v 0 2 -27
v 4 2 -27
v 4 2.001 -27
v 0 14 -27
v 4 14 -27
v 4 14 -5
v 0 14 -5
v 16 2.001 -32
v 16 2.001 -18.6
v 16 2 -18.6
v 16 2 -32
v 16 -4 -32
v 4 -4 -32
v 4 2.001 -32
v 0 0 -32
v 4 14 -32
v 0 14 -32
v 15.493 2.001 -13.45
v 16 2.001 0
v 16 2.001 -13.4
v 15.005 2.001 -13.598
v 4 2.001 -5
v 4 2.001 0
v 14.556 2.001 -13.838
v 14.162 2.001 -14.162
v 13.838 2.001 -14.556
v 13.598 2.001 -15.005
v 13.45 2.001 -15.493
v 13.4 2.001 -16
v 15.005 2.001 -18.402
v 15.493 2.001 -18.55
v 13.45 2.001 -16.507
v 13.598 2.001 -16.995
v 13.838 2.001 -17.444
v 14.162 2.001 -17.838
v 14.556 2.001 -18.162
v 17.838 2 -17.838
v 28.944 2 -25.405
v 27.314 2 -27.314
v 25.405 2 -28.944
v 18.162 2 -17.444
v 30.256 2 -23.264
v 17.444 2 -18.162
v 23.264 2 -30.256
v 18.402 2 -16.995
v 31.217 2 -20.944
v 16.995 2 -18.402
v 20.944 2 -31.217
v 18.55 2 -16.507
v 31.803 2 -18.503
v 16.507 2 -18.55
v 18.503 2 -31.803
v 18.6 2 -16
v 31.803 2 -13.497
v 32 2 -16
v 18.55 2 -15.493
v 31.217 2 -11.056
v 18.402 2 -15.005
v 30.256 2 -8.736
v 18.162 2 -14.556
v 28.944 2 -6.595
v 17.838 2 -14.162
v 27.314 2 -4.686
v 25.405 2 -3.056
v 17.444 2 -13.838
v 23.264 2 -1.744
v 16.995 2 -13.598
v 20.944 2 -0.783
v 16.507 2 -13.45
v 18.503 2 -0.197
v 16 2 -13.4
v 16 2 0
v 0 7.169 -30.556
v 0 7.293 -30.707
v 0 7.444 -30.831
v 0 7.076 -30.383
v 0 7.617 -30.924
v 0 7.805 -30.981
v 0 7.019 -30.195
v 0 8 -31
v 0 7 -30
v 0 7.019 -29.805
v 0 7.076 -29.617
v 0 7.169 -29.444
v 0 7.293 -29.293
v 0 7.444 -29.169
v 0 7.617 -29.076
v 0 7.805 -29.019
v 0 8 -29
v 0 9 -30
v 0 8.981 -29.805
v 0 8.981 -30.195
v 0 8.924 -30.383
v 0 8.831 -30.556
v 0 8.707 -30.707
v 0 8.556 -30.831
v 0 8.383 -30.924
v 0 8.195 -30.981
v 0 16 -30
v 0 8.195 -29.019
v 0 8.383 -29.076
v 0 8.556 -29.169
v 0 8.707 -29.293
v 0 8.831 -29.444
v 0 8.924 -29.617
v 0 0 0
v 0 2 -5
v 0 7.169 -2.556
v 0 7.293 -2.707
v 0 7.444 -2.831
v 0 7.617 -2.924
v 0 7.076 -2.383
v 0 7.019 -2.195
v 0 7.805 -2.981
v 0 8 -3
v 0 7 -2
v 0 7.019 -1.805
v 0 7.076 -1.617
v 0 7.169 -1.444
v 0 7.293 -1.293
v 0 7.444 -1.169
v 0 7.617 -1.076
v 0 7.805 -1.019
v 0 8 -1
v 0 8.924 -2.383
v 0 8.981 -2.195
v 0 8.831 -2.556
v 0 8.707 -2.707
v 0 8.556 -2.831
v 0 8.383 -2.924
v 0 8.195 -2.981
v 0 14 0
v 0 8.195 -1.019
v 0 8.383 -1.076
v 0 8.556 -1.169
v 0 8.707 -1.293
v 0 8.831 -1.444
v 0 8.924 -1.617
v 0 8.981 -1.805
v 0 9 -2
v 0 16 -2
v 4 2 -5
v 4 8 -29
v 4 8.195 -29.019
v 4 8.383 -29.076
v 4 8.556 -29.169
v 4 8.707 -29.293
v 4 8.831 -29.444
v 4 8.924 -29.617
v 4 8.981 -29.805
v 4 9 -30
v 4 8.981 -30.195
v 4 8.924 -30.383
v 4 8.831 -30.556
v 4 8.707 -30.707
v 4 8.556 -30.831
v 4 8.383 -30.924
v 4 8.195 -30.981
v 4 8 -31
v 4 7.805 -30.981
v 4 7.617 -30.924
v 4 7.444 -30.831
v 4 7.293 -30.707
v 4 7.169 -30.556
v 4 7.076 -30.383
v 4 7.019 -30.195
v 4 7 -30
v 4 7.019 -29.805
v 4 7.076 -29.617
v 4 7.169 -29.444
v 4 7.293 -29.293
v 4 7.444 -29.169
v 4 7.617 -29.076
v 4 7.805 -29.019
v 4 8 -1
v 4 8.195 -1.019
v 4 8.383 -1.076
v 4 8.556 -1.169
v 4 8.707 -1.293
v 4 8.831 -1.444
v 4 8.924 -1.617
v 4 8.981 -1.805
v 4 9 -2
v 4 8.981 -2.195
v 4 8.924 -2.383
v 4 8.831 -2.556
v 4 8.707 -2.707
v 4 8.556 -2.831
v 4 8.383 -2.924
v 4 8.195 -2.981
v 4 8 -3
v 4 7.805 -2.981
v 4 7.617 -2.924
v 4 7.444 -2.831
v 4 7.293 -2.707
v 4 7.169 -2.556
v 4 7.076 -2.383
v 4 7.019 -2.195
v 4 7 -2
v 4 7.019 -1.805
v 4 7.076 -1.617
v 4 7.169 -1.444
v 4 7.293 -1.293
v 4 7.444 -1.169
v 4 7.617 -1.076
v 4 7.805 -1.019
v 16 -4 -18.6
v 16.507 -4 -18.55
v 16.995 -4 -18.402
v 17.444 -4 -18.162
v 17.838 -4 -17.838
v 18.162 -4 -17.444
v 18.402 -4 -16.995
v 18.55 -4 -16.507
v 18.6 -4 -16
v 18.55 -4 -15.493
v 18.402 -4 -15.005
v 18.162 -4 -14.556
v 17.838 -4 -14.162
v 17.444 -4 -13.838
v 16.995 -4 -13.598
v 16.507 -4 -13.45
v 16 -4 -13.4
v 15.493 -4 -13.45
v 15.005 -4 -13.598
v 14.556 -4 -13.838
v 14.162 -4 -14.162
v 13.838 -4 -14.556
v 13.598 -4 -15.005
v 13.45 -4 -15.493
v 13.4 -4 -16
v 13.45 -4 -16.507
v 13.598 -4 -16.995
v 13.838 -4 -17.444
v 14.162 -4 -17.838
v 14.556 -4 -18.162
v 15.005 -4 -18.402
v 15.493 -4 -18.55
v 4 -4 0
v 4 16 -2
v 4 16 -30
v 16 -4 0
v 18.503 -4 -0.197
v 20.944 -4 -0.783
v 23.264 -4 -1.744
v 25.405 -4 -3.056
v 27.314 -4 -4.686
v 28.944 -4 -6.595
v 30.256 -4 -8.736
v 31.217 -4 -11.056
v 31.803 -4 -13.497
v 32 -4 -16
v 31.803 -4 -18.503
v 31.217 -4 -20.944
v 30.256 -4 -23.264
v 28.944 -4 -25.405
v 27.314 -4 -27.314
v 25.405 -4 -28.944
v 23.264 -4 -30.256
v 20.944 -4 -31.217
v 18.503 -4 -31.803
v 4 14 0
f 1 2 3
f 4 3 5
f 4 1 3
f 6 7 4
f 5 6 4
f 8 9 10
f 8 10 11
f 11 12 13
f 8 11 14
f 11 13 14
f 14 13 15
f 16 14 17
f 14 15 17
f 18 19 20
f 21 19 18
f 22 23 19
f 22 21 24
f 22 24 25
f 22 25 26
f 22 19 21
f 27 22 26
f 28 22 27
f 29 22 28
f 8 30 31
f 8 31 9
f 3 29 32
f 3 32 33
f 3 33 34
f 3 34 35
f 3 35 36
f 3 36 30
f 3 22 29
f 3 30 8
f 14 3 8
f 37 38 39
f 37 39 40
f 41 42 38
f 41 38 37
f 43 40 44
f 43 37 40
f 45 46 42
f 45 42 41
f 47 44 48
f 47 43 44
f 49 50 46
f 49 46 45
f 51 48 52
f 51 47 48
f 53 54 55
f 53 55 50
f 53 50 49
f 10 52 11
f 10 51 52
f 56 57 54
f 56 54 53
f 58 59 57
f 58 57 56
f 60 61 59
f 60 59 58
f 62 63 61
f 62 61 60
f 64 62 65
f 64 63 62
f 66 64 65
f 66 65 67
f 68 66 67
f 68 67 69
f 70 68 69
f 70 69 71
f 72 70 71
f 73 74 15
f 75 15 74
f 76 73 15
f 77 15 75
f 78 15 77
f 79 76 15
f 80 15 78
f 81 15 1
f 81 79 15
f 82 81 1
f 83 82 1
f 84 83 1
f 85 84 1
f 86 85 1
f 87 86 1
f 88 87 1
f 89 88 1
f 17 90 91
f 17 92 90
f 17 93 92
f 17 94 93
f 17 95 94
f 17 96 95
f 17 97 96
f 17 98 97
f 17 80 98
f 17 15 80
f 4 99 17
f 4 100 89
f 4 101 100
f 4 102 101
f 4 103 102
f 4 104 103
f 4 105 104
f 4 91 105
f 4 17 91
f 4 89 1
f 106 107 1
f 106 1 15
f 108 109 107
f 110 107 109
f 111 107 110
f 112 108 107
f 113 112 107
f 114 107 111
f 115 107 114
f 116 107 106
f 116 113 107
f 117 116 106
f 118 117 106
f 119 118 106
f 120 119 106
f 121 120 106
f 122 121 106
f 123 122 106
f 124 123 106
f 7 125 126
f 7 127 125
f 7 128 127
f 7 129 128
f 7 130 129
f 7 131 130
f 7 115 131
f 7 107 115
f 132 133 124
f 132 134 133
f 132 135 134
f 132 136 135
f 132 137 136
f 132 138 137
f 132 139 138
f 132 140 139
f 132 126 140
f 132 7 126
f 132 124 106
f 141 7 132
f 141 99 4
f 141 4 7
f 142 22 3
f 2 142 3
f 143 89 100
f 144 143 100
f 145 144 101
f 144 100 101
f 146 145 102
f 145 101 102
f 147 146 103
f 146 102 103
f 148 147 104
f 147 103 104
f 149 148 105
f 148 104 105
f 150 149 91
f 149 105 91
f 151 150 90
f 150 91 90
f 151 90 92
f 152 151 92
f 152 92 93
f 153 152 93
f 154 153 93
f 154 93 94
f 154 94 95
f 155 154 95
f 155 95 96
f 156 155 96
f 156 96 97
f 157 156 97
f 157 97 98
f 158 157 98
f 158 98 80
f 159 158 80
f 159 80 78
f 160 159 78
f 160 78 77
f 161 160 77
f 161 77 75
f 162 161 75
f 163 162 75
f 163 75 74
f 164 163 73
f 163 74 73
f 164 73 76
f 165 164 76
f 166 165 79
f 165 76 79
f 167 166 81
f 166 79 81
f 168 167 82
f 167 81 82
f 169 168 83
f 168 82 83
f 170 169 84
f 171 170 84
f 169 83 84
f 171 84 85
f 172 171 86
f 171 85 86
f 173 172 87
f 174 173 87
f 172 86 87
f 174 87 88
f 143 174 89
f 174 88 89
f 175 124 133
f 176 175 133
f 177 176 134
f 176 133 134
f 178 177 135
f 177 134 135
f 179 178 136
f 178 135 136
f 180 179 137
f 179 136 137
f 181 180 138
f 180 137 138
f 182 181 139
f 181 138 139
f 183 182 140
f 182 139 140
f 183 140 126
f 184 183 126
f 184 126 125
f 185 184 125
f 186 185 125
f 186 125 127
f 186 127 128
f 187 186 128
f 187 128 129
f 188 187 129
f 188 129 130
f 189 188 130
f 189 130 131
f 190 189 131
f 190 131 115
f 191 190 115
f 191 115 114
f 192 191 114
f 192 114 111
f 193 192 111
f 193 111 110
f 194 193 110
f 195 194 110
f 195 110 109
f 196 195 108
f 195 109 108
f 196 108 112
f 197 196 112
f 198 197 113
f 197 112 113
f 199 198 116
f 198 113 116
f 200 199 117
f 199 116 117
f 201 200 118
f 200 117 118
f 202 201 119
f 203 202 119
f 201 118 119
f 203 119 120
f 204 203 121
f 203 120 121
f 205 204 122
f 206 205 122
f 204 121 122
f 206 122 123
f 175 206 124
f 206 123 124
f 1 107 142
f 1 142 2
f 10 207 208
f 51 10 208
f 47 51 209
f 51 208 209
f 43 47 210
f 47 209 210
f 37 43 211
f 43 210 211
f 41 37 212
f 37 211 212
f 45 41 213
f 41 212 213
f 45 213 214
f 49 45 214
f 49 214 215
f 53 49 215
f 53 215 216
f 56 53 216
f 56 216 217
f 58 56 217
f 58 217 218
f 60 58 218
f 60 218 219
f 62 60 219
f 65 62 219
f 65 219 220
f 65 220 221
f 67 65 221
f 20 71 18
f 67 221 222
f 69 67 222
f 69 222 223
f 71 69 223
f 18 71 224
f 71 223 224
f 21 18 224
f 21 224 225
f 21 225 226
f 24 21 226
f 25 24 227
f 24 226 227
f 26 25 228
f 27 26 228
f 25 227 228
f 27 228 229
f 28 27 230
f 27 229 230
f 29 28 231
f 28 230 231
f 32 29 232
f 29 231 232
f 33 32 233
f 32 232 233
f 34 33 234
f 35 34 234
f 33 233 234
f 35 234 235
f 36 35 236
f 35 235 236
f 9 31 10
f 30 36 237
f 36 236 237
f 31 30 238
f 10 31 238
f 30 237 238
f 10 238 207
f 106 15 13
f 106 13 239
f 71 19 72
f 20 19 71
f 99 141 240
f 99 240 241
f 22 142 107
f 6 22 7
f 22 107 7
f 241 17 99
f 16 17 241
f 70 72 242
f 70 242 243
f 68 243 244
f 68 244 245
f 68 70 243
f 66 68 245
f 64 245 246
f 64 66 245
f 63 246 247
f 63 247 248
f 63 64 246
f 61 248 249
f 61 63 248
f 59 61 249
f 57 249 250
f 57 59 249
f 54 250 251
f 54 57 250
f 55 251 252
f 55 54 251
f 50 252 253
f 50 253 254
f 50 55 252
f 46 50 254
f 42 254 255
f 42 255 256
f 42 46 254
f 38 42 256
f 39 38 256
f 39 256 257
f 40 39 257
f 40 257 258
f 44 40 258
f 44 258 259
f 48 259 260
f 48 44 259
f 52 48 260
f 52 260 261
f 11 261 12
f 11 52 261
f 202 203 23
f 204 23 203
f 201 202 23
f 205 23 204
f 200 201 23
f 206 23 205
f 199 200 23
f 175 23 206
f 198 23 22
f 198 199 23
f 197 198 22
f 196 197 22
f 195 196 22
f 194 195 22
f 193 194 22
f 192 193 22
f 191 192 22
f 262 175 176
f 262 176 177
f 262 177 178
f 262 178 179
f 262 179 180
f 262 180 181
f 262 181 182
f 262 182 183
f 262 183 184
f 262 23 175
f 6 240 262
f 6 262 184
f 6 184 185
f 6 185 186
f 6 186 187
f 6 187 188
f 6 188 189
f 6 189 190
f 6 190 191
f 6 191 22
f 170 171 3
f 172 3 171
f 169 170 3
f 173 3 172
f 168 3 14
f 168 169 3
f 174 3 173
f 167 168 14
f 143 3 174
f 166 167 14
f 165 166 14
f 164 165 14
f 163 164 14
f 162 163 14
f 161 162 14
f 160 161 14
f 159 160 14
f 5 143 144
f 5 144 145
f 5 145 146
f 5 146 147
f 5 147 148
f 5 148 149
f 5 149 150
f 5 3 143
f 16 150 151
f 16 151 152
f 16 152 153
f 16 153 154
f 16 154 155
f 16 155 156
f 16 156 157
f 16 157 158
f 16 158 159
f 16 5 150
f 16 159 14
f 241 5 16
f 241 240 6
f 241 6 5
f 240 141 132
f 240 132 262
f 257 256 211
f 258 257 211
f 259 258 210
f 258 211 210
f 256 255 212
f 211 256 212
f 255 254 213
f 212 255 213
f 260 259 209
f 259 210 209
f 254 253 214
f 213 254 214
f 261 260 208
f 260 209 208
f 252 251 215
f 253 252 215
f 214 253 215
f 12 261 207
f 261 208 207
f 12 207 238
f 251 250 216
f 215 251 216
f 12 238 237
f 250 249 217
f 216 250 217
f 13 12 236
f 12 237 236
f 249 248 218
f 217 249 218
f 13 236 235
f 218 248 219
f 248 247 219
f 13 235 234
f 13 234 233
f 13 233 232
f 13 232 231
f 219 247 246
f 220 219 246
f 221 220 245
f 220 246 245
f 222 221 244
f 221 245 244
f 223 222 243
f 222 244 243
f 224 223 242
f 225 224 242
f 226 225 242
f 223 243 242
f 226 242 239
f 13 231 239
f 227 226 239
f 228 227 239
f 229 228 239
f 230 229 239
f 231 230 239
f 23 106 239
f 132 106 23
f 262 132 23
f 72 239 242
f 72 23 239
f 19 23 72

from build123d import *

# Parameters (mm, degrees)
SKETCH1_W                = 32
SKETCH1_H                = 16
SKETCH1_W_2              = 22
SKETCH1_H_2              = 12
BOSS_EXTRUDE1_DEPTH      = 4
SKETCH3_W                = 32
SKETCH3_H                = 2.001260946
BOSS_EXTRUDE3_DEPTH      = 12
BOSS_EXTRUDE5_DEPTH      = 4
BOSS_EXTRUDE5_DEPTH_BACK = 2
CHAMFER1_SIZE            = 4
SKETCH8_R                = 2.6
CUT_EXTRUDE2_DEPTH       = 50.477267507
SKETCH9_R                = 1
CUT_EXTRUDE3_DEPTH       = 49
CHAMFER2_SIZE            = 2


with BuildPart() as part:
    # Sketch1 → Boss-Extrude1 (new body)
    with BuildSketch(Plane(origin=(0, 0, 0), x_dir=(0, 0, -1), z_dir=(1, 0, 0))):
        with Locations((16, 8)):
            Rectangle(SKETCH1_W, SKETCH1_H)
        with Locations((16, 8)):
            Rectangle(SKETCH1_W_2, SKETCH1_H_2, mode=Mode.SUBTRACT)
    extrude(amount=BOSS_EXTRUDE1_DEPTH)

    # Sketch3 → Boss-Extrude3 (add)
    with BuildSketch(Plane(origin=(4, 0, 0), x_dir=(0, 0, -1), z_dir=(1, 0, 0))):
        with Locations((16, 1.000630473)):
            Rectangle(SKETCH3_W, SKETCH3_H)
    extrude(amount=BOSS_EXTRUDE3_DEPTH)

    # Sketch7 → Boss-Extrude5 (add, two sides: drawn at the far end of the back side and taken through both)
    with BuildSketch(Plane.XZ.offset(-BOSS_EXTRUDE5_DEPTH_BACK)):
        with BuildLine():
            Line((0, 0), (16, 0))
            ThreePointArc((16, 0), (32, -16), (16, -32))
            Line((16, -32), (0, -32))
            Line((0, -32), (0, 0))
        make_face()
    extrude(amount=BOSS_EXTRUDE5_DEPTH + BOSS_EXTRUDE5_DEPTH_BACK)

    # Chamfer1
    chamfer1_edges = [part.edges().sort_by_distance(p)[0] for p in [
        (0, -4, -16),
    ]]
    chamfer(chamfer1_edges, length=CHAMFER1_SIZE)

    # Sketch8 → Cut-Extrude2 (cut, through all)
    with BuildSketch(Plane.XZ.offset(4)):
        with Locations(Location((16, -16, 0), (0, 0, 270))):
            Circle(SKETCH8_R)
    extrude(amount=-CUT_EXTRUDE2_DEPTH, mode=Mode.SUBTRACT)

    # Sketch9 → Cut-Extrude3 (cut, through all)
    with BuildSketch(Plane.ZY):
        with Locations((-30, 8)):
            Circle(SKETCH9_R)
        with Locations((-2, 8)):
            Circle(SKETCH9_R)
    extrude(amount=-CUT_EXTRUDE3_DEPTH, mode=Mode.SUBTRACT)

    # Chamfer2
    chamfer2_edges = [part.edges().sort_by_distance(p)[0] for p in [
        (2, 16, 0),
        (2, 16, -32),
    ]]
    chamfer(chamfer2_edges, length=CHAMFER2_SIZE)


solid = part.part
